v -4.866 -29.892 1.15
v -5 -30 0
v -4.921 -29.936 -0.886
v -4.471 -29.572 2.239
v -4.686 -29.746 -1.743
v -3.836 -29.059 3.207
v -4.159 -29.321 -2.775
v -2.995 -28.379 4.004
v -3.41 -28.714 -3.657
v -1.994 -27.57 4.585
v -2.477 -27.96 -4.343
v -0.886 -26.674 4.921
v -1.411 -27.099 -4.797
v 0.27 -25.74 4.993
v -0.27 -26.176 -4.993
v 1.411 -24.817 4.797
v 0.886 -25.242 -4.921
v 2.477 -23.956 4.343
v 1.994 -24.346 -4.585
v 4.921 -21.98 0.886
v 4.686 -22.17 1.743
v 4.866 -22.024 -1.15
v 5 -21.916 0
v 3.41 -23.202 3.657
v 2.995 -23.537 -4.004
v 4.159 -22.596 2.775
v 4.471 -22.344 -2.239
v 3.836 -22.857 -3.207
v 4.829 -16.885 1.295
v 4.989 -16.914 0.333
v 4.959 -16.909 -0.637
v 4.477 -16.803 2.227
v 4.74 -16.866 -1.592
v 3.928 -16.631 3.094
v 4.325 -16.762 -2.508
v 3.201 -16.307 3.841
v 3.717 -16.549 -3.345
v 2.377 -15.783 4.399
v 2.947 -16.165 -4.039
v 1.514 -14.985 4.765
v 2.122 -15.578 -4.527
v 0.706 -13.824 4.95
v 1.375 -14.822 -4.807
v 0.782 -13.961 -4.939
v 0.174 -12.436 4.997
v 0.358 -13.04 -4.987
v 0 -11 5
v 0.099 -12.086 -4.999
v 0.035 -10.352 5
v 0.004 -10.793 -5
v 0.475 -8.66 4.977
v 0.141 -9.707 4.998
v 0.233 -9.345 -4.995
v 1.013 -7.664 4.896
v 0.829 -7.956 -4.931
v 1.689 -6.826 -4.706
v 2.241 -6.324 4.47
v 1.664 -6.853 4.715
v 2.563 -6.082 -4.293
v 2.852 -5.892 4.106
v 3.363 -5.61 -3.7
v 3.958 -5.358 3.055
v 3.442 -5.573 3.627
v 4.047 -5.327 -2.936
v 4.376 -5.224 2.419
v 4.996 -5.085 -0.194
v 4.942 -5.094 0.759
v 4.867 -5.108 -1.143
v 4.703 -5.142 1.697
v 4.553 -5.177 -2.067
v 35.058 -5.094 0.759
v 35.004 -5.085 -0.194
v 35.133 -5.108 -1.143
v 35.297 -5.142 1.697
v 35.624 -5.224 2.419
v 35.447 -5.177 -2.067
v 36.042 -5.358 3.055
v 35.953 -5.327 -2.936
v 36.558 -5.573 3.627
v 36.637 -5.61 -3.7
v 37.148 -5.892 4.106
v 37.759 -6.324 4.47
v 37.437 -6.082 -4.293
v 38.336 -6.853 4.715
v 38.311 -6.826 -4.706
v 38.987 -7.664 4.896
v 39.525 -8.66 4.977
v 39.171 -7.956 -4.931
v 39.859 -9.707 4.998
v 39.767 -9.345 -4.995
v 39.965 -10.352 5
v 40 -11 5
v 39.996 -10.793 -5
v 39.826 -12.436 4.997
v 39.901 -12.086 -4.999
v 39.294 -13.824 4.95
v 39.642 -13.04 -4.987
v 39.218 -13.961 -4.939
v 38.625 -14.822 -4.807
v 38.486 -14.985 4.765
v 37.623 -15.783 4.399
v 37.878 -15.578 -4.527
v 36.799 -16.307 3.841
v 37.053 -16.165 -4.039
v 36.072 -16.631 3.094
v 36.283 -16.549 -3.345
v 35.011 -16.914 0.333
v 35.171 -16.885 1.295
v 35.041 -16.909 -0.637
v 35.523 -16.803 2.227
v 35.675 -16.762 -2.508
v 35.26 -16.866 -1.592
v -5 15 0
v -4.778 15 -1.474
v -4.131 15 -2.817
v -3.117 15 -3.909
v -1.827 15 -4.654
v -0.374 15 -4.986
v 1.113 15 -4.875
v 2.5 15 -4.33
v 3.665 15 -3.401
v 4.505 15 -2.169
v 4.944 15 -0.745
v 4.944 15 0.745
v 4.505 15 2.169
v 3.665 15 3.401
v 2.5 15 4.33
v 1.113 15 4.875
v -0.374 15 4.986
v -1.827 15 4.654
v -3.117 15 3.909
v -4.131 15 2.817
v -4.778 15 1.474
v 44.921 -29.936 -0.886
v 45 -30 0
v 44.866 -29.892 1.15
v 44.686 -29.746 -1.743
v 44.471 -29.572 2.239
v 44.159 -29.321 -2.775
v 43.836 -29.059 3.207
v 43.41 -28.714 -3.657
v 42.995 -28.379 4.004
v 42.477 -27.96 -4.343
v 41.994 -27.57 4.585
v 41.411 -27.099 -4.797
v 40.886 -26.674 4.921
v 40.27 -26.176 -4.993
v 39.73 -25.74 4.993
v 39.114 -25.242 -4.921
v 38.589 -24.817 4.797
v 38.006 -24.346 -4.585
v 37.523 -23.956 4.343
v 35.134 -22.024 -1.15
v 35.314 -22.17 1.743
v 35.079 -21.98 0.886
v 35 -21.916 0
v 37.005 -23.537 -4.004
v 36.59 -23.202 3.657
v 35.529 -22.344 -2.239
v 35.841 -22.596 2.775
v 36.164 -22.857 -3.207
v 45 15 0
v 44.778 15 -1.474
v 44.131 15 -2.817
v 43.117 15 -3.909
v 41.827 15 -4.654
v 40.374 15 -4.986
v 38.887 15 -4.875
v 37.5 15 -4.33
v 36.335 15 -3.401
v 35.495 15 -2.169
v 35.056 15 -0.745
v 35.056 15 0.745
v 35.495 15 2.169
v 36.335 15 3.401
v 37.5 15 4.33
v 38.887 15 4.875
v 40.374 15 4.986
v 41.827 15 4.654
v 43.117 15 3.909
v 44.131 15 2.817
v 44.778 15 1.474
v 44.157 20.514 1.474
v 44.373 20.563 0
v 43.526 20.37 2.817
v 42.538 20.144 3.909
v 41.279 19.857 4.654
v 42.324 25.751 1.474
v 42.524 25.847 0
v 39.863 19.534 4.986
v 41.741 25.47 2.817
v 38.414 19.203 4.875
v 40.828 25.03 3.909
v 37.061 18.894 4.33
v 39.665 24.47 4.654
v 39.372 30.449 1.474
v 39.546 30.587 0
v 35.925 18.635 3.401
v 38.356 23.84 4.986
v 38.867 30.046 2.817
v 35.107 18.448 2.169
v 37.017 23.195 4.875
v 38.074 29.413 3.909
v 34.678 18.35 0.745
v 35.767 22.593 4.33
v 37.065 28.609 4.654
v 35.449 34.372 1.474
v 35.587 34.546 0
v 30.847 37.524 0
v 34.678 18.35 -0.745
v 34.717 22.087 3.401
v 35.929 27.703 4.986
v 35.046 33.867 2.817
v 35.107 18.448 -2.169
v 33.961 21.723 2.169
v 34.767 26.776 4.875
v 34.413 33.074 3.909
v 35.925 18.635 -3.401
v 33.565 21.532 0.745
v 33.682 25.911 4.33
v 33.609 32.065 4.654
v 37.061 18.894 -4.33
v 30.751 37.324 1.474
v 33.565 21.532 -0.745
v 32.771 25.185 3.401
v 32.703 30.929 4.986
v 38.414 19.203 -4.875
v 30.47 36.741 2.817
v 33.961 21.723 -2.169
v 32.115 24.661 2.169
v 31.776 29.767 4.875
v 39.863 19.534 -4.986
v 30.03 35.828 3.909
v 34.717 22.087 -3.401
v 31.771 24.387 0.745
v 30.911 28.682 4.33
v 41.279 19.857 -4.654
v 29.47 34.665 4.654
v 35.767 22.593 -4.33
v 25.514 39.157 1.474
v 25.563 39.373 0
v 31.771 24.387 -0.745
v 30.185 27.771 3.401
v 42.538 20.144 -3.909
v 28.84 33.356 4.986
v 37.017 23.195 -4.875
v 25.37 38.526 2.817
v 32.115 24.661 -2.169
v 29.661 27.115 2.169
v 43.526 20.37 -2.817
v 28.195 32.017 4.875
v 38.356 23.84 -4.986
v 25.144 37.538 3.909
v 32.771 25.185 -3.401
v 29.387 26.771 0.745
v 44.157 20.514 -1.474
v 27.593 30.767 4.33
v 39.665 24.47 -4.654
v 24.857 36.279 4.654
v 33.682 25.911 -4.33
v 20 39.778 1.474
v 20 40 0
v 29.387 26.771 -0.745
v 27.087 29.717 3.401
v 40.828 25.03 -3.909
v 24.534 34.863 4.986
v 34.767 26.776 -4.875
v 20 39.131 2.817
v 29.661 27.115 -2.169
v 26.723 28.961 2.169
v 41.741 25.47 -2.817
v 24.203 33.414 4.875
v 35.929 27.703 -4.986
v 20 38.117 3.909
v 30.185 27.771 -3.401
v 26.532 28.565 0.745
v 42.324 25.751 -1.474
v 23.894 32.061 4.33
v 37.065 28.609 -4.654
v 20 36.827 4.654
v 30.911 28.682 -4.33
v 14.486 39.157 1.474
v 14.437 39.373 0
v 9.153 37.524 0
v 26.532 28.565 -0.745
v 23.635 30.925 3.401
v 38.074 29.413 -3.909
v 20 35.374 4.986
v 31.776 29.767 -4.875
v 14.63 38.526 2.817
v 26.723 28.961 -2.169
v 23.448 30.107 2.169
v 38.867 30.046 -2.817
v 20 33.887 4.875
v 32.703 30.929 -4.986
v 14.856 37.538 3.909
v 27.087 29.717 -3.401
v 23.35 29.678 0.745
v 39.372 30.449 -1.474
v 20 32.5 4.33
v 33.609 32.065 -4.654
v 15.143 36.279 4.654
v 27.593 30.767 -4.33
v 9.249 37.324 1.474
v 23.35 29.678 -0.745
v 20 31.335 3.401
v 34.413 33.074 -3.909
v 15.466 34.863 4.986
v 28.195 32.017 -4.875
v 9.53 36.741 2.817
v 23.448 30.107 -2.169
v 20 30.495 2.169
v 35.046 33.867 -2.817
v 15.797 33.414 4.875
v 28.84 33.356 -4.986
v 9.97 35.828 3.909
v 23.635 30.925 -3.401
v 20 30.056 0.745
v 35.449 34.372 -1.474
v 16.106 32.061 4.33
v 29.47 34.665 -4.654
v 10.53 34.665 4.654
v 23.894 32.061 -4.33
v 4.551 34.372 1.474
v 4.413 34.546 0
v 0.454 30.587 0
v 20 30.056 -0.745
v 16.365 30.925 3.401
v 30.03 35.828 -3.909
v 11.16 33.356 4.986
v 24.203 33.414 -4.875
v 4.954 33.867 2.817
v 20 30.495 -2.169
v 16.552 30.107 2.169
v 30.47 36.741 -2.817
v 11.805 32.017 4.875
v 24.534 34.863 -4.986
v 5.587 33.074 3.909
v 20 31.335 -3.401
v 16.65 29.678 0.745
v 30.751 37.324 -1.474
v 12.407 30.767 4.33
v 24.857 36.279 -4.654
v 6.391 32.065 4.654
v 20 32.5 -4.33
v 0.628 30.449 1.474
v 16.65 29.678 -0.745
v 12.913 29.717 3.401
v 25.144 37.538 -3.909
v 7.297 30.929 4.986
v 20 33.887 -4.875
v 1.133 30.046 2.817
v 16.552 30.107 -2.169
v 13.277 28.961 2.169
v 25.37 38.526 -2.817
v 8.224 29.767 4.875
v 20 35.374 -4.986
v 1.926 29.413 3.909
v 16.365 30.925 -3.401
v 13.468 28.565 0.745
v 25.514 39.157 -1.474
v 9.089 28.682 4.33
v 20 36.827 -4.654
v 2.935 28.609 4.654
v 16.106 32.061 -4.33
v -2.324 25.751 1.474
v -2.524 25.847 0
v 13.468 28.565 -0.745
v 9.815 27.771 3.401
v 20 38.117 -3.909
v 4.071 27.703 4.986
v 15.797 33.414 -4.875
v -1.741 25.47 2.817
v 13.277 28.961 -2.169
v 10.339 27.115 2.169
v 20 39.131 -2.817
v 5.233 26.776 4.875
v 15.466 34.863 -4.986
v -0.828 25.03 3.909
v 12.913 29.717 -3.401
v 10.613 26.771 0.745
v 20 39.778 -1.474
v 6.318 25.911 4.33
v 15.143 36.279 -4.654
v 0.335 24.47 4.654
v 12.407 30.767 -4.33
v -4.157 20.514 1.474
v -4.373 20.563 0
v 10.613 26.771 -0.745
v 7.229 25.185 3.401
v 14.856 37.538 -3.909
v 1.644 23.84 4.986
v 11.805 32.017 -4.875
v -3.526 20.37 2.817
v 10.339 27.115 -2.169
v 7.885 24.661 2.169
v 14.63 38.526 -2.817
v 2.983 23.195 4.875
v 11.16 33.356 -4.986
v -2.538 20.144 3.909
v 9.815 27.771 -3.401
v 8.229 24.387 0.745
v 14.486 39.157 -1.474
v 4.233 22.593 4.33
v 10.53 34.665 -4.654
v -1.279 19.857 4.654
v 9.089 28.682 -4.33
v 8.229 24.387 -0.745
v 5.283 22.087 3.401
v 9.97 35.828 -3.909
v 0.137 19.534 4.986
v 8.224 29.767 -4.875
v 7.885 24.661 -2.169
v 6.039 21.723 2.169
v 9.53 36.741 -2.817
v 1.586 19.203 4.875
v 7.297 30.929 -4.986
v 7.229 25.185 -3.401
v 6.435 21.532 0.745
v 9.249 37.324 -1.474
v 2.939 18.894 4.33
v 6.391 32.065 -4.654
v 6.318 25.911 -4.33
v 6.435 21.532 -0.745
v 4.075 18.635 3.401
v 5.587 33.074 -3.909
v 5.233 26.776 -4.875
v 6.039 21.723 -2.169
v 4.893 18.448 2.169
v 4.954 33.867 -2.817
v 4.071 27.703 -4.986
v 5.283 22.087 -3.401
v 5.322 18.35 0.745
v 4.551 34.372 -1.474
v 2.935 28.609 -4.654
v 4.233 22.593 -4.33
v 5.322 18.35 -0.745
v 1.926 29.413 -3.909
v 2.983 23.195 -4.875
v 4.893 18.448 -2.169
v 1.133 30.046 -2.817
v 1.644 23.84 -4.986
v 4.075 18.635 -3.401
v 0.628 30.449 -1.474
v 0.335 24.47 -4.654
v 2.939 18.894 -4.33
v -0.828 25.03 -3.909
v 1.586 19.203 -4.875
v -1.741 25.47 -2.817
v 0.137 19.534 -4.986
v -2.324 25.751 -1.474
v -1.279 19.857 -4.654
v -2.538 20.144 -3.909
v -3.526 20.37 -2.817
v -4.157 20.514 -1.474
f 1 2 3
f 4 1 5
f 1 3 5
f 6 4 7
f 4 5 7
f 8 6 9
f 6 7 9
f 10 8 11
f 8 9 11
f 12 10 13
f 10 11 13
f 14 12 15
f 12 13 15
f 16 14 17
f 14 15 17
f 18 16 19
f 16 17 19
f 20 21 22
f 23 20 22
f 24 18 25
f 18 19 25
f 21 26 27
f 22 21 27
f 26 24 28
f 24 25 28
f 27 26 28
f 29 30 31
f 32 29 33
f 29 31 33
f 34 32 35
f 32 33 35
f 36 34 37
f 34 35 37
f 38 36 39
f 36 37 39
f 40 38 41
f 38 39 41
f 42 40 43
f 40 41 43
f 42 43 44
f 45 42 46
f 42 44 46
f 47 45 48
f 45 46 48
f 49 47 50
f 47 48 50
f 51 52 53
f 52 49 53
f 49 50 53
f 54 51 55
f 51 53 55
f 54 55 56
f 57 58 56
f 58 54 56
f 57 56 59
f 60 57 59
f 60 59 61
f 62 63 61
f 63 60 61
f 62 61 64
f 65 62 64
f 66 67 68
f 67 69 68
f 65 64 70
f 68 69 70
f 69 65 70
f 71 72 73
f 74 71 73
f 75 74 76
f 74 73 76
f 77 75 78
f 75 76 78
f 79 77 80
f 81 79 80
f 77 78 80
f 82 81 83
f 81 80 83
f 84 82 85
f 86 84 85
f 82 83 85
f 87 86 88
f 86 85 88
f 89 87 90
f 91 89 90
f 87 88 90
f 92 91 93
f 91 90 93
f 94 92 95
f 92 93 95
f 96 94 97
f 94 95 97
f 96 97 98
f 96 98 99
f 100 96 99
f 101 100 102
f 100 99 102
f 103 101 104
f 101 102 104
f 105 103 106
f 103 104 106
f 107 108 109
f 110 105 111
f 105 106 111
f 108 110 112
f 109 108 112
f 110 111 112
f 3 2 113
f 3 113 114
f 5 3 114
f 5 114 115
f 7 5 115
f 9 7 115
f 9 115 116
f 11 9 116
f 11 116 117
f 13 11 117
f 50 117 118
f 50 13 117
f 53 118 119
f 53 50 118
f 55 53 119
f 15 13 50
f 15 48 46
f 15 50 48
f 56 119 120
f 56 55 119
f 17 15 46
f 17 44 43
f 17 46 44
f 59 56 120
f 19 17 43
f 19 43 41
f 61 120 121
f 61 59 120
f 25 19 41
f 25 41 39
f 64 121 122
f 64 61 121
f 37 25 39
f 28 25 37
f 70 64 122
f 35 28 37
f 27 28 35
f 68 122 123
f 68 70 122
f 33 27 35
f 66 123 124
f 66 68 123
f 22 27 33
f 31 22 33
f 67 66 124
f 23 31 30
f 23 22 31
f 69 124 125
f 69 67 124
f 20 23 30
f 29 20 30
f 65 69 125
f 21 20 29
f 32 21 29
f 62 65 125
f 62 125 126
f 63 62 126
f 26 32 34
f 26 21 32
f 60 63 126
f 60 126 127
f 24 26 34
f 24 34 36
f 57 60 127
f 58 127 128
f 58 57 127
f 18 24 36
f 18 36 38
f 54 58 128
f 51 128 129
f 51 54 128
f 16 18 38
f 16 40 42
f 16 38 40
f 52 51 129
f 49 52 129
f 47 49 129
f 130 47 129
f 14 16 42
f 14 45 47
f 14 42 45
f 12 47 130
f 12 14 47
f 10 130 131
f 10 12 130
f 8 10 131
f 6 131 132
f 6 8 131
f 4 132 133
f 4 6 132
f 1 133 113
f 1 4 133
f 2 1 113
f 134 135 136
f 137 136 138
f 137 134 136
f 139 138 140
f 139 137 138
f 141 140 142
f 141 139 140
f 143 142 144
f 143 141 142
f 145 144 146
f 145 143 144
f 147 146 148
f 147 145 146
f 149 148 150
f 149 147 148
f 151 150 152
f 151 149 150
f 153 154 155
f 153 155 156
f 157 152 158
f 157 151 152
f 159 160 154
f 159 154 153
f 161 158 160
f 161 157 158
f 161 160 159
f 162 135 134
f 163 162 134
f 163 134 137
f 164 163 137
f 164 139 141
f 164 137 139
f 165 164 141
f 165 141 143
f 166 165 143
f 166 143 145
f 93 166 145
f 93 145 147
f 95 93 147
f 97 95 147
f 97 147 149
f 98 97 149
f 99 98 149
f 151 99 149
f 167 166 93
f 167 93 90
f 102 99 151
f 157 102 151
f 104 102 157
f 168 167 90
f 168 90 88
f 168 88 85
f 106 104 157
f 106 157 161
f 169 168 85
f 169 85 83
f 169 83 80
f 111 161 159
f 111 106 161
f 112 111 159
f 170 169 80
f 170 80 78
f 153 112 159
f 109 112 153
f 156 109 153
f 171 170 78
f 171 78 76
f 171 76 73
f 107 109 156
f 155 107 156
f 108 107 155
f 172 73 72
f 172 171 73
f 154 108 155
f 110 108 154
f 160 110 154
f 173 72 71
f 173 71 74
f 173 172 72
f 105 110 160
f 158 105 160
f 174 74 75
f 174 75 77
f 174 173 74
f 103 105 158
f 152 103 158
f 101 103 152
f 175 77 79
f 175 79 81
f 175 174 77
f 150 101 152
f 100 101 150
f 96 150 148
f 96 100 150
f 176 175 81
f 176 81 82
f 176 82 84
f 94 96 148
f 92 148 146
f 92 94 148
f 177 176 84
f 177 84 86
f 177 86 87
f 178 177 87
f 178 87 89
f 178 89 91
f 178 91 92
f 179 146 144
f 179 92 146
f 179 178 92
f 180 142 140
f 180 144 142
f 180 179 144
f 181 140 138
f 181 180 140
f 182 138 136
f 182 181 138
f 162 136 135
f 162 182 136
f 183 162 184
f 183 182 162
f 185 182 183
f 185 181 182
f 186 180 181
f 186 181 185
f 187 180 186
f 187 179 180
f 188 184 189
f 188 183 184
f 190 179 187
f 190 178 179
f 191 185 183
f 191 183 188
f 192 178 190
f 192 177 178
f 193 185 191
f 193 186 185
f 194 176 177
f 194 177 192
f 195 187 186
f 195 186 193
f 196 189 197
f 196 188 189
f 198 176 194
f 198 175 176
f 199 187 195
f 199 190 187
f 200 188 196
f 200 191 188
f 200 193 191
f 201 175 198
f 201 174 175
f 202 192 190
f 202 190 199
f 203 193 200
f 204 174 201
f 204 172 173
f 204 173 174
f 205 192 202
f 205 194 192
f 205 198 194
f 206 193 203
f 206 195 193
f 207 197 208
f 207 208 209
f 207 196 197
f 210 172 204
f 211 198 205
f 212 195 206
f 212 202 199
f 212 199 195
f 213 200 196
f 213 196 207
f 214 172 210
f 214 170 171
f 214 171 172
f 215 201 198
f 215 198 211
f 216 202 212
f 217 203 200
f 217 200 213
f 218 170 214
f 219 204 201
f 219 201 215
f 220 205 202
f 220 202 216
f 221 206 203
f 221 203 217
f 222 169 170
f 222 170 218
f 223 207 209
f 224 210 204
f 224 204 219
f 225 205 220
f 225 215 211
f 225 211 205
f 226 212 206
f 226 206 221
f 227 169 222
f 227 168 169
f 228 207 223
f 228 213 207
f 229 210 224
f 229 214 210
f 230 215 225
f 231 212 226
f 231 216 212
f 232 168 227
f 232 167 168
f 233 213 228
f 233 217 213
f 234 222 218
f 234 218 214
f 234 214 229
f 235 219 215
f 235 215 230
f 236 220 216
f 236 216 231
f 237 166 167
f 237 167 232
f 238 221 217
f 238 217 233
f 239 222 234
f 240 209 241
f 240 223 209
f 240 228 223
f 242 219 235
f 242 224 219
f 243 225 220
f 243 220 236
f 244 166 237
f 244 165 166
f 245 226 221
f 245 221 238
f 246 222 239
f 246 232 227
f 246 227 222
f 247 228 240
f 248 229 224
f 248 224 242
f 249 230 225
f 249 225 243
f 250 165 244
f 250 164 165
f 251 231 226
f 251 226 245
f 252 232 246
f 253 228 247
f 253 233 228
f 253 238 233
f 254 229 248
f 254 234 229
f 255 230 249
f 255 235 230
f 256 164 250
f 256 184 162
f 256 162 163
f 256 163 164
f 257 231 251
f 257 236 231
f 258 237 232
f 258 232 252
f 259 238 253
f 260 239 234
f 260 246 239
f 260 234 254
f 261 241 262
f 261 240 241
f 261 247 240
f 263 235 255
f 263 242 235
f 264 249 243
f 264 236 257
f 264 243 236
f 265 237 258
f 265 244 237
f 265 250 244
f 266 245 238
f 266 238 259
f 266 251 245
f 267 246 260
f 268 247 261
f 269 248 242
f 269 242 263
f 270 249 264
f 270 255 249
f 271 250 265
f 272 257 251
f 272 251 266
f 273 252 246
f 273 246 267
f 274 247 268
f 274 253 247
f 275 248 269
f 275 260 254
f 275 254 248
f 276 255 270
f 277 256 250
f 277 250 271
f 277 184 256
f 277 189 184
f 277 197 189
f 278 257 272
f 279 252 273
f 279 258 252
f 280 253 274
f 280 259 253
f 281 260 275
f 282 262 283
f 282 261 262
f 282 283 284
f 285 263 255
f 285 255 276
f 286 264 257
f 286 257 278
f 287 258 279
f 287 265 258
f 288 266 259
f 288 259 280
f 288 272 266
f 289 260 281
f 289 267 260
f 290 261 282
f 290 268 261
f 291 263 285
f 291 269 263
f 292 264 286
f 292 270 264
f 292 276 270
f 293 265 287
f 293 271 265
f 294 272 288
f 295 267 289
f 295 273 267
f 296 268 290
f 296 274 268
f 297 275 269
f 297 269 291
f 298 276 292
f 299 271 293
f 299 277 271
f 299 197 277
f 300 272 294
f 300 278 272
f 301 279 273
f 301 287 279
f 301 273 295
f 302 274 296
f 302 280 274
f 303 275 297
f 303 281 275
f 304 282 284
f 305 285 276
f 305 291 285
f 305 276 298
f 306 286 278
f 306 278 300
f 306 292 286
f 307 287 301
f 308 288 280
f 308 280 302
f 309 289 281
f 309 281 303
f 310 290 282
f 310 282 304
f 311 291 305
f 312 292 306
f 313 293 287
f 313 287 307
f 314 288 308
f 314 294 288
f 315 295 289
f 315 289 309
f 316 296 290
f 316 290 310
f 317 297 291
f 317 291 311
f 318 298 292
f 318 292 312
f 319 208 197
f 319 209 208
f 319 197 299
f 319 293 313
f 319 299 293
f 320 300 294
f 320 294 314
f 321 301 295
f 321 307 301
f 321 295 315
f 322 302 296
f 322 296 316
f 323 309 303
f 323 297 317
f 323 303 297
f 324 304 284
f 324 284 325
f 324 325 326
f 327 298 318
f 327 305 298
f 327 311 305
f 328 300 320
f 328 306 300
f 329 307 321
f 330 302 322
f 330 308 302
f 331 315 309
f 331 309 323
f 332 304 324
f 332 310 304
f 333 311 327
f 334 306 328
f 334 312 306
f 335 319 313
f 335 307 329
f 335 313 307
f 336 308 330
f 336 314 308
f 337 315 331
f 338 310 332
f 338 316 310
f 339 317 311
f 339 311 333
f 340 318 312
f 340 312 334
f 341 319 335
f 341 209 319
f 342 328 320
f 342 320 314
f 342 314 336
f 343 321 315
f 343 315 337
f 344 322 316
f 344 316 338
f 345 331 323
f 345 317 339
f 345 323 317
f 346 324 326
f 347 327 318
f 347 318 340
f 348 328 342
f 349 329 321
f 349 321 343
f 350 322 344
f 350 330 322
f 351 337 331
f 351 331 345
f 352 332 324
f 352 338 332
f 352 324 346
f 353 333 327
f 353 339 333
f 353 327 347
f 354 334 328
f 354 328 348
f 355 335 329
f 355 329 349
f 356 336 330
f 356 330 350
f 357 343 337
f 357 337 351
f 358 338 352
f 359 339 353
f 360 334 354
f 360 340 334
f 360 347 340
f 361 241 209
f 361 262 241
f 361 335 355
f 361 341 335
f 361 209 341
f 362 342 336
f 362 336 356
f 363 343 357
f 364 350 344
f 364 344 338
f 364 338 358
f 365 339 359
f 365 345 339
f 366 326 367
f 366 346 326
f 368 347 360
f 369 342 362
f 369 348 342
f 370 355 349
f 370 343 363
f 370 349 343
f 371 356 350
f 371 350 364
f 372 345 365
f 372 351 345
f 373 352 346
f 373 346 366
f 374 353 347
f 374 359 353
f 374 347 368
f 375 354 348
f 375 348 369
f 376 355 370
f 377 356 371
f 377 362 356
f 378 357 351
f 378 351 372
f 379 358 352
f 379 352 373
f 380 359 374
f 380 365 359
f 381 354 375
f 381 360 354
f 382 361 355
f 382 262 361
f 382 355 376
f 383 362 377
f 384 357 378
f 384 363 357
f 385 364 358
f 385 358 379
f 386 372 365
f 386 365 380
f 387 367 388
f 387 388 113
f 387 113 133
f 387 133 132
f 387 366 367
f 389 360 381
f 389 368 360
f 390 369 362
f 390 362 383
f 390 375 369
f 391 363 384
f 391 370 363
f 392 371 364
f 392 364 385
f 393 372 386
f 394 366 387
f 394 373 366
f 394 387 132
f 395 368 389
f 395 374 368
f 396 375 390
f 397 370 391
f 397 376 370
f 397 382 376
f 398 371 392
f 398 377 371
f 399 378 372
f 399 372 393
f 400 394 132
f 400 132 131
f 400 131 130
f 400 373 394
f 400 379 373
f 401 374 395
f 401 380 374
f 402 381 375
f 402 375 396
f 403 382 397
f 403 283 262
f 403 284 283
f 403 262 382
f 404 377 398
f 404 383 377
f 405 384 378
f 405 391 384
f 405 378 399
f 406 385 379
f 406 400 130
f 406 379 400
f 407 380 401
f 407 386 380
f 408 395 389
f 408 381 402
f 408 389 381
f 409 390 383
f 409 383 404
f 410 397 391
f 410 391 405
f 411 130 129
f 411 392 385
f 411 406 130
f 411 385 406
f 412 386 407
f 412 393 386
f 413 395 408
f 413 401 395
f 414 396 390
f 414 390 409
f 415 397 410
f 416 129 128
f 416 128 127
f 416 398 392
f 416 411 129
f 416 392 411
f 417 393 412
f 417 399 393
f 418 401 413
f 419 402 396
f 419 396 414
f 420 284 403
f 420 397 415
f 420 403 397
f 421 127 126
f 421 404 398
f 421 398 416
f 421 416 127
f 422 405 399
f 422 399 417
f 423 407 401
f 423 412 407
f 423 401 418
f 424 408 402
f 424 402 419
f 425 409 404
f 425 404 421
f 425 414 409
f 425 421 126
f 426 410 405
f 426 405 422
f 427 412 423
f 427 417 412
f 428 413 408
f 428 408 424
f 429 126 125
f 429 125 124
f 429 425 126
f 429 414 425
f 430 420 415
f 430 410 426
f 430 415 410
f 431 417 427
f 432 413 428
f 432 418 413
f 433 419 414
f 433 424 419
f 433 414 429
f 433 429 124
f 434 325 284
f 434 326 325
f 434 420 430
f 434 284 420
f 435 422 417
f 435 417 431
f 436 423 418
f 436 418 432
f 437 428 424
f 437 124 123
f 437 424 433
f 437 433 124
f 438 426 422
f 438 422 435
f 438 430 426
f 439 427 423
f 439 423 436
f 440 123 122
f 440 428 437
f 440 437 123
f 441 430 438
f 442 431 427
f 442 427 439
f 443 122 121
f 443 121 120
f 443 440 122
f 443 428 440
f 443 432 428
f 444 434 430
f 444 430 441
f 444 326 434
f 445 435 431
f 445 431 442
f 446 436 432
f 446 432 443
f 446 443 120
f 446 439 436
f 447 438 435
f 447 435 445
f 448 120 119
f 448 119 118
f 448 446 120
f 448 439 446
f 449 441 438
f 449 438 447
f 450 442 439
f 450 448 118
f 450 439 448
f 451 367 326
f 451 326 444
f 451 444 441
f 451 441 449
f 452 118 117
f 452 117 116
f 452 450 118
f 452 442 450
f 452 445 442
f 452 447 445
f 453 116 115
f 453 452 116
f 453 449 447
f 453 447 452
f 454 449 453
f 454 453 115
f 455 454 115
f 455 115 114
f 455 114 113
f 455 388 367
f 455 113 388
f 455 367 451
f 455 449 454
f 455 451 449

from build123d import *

# Parameters (mm, degrees)
SWEEP1_PROFILE_R        = 5
CUT_EXTRUDE1_DEPTH      = 61.415230017
CUT_EXTRUDE1_DEPTH_BACK = 61.415230017
CUT_EXTRUDE3_DEPTH      = 61.415230017
CUT_EXTRUDE3_DEPTH_BACK = 61.415230017


with BuildPart() as part:
    # Sweep1: sweep along a path in Sketch2
    with BuildLine(Plane.XY) as sweep1_path:
        Line((40, -30), (40, 0))
        Line((40, 0), (40, 15))
        ThreePointArc((40, 15), (20, 35), (0, 15))
        Line((0, 15), (0, 0))
        Line((0, 0), (0, -30))
    # Sweep1 profile (on start of the path) → Sweep1 (sweep)
    with BuildSketch(Plane(origin=(40, -30, 0), x_dir=(1, 0, 0), z_dir=(0, 1, 0))):
        Circle(SWEEP1_PROFILE_R)
    sweep(path=sweep1_path.line)

    # Sketch14 → Cut-Extrude1 (cut, two sides: drawn at the far end of the back side and taken through both)
    with BuildSketch(Plane.XY.offset(-CUT_EXTRUDE1_DEPTH_BACK)):
        with BuildLine():
            Line((6, -5), (34, -5))
            ThreePointArc((34, -5), (40, -11), (34, -17))
            Line((34, -17), (6, -17))
            ThreePointArc((6, -17), (0, -11), (6, -5))
        make_face()
    extrude(amount=CUT_EXTRUDE1_DEPTH + CUT_EXTRUDE1_DEPTH_BACK, mode=Mode.SUBTRACT)

    # Sketch22 → Cut-Extrude3 (cut, two sides: drawn at the far end of the back side and taken through both)
    with BuildSketch(Plane.XY.offset(-CUT_EXTRUDE3_DEPTH_BACK)):
        Polygon((-5, -30), (5, -21.916079783), (5, -30), align=None)
        Polygon((35, -30), (45, -30), (35, -21.916079783), align=None)
    extrude(amount=CUT_EXTRUDE3_DEPTH + CUT_EXTRUDE3_DEPTH_BACK, mode=Mode.SUBTRACT)


solid = part.part
